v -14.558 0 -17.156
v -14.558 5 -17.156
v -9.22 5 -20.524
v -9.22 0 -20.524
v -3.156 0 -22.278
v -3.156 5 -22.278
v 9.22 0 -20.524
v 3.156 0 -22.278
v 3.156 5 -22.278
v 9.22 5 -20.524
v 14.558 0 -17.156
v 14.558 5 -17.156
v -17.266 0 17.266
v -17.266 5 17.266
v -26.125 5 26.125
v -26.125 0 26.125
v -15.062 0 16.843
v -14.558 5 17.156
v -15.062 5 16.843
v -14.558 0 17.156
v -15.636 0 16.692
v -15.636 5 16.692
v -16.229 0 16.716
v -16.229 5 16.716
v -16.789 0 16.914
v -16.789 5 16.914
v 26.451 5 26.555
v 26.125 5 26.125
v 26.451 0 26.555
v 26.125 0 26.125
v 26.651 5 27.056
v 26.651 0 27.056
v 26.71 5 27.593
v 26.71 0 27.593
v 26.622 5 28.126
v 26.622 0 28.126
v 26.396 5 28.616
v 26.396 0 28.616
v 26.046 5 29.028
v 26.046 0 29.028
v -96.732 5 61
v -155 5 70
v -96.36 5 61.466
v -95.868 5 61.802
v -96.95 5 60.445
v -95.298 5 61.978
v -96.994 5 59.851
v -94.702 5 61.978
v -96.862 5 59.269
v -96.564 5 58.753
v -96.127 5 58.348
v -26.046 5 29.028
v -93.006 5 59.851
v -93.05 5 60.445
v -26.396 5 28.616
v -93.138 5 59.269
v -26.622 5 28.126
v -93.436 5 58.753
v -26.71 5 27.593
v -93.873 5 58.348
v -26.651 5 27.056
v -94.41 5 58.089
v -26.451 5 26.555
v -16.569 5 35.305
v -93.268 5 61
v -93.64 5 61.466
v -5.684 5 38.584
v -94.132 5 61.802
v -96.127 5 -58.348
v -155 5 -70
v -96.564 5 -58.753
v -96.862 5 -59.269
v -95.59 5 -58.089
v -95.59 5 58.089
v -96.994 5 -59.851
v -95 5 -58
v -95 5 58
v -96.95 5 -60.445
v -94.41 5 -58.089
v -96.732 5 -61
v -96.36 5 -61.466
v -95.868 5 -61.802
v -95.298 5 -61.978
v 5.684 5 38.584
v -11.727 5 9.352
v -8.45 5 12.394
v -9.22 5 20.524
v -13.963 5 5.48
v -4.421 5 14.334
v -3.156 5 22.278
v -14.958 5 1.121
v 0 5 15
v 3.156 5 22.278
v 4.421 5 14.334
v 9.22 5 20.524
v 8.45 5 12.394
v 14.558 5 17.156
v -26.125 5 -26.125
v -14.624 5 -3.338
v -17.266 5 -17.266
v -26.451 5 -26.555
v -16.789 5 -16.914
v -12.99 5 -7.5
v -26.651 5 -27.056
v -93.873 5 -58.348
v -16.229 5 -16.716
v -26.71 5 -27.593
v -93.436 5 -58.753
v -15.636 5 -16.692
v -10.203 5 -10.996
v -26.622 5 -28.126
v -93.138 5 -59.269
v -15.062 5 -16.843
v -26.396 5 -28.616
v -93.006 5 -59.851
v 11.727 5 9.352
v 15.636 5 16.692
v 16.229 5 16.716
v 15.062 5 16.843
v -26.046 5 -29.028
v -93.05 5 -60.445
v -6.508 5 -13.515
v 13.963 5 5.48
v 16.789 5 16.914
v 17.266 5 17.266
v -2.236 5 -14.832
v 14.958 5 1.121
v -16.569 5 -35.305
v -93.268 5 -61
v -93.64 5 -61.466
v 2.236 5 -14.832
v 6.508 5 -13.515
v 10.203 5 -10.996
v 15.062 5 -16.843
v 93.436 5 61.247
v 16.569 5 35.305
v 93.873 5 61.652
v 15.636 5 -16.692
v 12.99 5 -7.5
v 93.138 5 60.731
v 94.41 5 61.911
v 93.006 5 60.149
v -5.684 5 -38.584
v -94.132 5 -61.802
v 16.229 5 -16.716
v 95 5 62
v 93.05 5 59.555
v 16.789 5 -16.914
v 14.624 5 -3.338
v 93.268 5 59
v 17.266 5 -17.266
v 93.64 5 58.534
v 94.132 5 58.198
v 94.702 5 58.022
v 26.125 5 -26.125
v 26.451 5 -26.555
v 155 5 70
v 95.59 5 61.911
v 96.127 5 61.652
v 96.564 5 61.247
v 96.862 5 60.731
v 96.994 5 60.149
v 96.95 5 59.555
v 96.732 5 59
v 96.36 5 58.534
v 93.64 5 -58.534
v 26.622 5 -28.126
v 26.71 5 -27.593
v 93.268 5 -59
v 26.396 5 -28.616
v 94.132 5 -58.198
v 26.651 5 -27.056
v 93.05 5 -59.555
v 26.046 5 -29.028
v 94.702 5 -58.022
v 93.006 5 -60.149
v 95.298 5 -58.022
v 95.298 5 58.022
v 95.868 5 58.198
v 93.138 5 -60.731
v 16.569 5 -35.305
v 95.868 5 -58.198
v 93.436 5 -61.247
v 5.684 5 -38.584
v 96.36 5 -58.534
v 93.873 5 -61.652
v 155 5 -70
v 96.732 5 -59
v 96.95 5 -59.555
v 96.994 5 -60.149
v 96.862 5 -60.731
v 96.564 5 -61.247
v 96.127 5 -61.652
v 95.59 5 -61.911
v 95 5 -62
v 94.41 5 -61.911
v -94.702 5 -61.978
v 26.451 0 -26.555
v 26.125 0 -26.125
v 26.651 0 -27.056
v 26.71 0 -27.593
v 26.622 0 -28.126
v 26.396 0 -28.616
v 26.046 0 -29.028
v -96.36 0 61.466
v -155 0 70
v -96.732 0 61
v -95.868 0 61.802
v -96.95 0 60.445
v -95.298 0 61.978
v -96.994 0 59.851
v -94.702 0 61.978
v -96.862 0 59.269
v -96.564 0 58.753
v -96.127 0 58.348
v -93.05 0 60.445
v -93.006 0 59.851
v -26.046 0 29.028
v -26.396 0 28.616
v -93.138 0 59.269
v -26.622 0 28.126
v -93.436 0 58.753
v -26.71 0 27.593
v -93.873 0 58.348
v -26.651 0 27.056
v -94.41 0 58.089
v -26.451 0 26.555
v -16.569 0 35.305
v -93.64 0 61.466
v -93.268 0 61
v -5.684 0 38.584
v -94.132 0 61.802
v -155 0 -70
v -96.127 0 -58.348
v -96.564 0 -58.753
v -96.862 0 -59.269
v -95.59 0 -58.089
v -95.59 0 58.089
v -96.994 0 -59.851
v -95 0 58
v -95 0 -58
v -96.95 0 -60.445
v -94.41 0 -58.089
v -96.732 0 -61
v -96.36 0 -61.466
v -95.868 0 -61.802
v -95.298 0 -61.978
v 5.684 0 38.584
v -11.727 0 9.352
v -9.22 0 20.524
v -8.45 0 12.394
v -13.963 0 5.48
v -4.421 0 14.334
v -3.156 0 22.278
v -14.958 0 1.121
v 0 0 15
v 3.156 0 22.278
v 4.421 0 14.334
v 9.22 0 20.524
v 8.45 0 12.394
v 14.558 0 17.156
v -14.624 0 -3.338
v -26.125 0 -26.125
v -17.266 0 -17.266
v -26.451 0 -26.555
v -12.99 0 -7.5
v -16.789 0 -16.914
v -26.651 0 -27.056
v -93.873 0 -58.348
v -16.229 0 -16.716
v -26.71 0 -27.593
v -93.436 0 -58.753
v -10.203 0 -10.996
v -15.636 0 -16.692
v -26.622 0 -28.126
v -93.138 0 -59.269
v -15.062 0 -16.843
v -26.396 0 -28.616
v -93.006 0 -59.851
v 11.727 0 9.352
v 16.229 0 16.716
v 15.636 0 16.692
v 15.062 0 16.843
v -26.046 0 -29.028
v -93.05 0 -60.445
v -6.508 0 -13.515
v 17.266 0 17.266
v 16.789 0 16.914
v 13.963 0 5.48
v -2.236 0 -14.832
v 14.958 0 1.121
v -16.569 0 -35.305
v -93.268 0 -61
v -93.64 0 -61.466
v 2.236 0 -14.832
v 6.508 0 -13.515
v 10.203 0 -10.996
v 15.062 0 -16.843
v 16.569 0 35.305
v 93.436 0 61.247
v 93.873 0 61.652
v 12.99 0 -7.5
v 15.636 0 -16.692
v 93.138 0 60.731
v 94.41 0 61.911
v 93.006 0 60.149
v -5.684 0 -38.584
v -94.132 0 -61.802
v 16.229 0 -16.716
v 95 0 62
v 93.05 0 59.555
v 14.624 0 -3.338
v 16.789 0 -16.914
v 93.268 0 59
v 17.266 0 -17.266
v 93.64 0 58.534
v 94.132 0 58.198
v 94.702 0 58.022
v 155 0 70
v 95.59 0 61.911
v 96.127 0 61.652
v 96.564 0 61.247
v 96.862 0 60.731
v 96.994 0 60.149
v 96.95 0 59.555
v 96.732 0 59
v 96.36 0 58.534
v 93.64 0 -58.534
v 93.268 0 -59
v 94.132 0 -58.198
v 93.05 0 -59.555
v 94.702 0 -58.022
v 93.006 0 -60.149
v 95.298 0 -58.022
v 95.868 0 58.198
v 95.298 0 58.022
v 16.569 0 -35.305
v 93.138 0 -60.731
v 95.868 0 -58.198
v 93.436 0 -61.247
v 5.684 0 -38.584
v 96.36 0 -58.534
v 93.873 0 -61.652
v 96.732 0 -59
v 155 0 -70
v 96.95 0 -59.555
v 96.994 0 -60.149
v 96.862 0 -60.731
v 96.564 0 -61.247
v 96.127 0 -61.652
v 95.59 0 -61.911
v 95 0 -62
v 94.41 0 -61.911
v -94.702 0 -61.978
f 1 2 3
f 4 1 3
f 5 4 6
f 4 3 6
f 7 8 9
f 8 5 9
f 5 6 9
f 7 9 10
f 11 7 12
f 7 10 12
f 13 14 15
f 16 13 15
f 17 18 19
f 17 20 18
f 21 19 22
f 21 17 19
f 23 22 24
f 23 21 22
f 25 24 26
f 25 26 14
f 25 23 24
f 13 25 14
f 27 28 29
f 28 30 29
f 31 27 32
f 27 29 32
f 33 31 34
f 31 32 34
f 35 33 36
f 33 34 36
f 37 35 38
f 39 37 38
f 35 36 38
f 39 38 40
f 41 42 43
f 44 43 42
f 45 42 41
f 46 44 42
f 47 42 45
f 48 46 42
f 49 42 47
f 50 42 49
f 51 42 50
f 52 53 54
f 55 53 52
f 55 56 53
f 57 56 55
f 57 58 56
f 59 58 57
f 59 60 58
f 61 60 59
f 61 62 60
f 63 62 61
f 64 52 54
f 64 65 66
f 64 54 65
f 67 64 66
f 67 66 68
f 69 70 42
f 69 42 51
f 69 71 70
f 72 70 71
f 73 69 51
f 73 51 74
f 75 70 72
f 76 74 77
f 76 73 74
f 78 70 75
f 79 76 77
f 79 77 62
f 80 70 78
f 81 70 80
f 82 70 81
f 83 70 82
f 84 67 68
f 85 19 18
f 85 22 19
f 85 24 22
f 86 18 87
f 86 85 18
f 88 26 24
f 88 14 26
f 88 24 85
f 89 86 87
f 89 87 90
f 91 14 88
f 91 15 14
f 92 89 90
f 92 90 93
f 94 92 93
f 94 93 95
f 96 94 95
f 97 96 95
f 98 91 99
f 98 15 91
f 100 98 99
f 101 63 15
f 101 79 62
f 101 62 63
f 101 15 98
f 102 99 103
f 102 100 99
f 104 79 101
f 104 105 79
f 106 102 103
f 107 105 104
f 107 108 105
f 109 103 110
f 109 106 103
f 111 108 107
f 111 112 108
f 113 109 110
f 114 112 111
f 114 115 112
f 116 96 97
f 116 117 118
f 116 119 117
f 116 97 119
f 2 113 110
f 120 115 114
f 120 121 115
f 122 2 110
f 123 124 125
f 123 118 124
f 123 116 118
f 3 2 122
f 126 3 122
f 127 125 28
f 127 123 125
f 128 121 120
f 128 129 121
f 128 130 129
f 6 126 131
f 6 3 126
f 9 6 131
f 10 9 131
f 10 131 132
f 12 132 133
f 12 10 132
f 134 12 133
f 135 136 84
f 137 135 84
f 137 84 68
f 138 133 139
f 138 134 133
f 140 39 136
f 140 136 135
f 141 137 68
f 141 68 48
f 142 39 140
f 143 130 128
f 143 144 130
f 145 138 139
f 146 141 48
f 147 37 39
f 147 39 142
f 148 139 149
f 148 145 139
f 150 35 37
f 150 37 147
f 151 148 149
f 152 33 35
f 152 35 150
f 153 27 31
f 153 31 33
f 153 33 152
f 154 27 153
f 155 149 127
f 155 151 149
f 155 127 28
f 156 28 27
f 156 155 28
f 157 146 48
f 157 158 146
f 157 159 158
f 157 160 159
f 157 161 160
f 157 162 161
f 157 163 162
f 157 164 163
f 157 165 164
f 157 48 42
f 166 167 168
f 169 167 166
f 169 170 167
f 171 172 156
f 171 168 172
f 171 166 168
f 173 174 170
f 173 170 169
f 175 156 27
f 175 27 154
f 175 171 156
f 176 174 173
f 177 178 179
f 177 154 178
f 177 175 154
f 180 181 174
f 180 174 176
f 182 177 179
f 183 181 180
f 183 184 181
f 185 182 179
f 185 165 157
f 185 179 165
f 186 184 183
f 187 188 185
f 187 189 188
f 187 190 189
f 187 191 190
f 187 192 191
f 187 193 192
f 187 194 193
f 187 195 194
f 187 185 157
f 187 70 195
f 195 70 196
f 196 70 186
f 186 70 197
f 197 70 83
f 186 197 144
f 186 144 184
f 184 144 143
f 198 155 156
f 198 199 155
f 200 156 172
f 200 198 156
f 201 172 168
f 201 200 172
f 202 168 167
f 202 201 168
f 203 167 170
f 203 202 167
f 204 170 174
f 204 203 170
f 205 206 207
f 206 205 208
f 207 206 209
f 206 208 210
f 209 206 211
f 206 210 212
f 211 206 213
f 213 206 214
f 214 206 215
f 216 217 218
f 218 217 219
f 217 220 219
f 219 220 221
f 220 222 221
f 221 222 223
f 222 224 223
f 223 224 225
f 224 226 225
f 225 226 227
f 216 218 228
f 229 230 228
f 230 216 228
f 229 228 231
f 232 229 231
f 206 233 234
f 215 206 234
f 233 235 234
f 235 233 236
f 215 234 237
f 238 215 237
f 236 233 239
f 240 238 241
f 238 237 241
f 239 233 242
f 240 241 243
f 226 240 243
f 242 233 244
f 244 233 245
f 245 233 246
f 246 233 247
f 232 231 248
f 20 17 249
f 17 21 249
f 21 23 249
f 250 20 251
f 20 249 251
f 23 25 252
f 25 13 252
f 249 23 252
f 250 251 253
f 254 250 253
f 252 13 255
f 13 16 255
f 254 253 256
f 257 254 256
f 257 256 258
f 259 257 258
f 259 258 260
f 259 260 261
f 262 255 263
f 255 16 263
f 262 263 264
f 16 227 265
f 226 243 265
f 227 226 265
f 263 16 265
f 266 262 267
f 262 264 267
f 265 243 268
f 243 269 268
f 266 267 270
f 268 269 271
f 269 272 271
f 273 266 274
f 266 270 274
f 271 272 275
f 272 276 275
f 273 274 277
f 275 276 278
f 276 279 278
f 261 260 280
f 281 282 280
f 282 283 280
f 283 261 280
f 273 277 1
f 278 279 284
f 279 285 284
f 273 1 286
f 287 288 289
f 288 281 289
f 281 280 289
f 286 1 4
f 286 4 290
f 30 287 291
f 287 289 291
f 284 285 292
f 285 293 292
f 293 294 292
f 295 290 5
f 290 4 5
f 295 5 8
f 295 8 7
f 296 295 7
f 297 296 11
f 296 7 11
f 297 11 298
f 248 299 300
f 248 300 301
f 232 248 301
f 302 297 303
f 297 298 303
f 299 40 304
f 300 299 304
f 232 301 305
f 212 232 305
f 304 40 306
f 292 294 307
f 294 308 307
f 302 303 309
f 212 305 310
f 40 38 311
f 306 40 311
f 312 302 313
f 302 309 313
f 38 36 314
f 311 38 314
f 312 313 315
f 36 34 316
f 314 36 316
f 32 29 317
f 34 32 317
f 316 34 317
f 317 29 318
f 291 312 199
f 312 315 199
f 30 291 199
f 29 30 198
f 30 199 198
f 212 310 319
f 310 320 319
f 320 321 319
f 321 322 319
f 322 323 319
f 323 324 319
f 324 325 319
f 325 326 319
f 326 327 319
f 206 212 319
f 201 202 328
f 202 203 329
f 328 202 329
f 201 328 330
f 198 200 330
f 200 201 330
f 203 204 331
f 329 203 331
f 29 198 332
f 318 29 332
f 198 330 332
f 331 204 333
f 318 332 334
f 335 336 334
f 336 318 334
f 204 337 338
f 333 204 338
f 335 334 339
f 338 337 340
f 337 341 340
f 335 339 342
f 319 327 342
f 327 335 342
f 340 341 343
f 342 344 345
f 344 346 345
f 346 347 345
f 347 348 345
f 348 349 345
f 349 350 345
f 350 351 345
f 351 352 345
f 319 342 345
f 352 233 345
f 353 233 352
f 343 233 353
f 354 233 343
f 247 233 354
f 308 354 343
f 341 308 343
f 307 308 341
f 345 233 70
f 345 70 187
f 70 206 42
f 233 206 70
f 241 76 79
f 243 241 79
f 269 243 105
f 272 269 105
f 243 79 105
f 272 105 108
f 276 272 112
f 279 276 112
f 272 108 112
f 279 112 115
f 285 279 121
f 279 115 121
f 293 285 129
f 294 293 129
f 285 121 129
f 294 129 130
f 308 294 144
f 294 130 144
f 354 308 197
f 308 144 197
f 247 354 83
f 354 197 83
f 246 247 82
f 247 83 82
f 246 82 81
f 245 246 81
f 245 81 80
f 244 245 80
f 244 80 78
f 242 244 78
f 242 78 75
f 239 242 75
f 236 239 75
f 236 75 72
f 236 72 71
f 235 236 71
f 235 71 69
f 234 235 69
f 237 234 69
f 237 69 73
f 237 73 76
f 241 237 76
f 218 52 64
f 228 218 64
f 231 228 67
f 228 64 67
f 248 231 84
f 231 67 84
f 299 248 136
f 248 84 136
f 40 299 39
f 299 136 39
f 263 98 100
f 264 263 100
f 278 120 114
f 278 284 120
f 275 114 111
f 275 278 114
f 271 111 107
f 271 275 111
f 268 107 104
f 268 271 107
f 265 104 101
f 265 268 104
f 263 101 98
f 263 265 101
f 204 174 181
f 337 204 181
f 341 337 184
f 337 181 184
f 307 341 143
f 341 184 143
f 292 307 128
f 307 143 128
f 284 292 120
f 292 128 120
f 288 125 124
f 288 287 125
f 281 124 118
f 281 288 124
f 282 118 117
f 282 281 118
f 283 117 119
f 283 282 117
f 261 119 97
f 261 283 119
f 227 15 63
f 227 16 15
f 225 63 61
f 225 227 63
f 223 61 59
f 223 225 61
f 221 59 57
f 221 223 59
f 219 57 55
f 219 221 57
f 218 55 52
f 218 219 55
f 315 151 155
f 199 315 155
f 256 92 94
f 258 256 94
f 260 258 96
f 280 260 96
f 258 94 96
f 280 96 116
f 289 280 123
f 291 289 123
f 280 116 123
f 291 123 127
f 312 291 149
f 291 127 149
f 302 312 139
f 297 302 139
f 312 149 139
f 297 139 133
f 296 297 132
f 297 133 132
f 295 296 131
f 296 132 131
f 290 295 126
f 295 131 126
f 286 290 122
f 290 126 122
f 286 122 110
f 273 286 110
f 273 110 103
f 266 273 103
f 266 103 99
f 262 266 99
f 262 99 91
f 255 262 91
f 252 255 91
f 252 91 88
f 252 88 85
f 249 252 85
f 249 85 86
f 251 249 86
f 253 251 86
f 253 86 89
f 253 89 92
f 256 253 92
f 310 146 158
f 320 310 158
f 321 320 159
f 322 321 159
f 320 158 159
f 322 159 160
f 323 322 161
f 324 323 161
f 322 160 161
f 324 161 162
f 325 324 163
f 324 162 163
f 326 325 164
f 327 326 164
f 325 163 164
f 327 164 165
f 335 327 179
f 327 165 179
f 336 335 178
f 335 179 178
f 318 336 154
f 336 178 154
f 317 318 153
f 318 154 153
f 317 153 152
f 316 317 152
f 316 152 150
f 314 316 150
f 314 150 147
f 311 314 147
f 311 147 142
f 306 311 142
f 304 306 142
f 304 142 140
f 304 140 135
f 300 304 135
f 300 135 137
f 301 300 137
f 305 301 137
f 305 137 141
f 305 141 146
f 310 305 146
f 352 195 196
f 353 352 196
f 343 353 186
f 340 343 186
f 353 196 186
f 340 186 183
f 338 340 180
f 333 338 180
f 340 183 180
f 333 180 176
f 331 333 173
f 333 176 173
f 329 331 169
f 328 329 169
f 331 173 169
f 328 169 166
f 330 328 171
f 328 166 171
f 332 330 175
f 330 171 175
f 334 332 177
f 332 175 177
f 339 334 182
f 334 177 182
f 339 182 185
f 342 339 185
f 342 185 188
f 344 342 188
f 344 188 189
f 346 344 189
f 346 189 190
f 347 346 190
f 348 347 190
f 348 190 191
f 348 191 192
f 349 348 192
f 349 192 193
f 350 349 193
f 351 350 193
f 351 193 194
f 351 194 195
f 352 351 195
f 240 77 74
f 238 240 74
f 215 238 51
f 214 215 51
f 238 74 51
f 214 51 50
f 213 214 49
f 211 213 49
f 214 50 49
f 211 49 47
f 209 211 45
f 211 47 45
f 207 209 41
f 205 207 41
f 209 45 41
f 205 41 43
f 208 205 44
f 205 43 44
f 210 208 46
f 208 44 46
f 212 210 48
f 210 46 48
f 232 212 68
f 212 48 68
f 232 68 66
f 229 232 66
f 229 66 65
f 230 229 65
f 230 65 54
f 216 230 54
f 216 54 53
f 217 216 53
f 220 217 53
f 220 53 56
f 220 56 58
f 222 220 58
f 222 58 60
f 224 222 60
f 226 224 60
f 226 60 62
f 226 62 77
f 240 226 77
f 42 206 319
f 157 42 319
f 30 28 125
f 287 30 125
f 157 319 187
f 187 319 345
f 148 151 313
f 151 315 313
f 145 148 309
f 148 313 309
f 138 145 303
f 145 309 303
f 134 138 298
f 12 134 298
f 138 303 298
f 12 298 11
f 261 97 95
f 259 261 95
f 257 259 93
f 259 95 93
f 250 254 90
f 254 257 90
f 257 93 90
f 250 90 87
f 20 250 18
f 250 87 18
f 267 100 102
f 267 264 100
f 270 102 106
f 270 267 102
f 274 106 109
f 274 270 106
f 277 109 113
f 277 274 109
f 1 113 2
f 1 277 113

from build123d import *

# Parameters (mm, degrees)
SKETCH2_W           = 310
SKETCH2_H           = 140
BOSS_EXTRUDE1_DEPTH = 5
SKETCH3_R           = 15
CUT_EXTRUDE1_DEPTH  = 171.146995272
SKETCH5_R           = 2
CUT_EXTRUDE2_DEPTH  = 171.146995272
CUT_EXTRUDE3_DEPTH  = 10
FILLET1_R           = 2


with BuildPart() as part:
    # Sketch2 → Boss-Extrude1 (new body)
    with BuildSketch(Plane(origin=(0, 0, 0), x_dir=(1, 0, 0), z_dir=(0, 1, 0))):
        Rectangle(SKETCH2_W, SKETCH2_H)
    extrude(amount=BOSS_EXTRUDE1_DEPTH)

    # Sketch3 → Cut-Extrude1 (cut, through all)
    with BuildSketch(Plane(origin=(0, 5, 0), x_dir=(1, 0, 0), z_dir=(0, 1, 0))):
        with Locations(Location((0, 0, 0), (0, 0, 270))):
            Circle(SKETCH3_R)
    extrude(amount=-CUT_EXTRUDE1_DEPTH, mode=Mode.SUBTRACT)

    # Sketch5 → Cut-Extrude2 (cut, through all)
    with BuildSketch(Plane(origin=(0, 5, 0), x_dir=(1, 0, 0), z_dir=(0, 1, 0))):
        with Locations(Location((-95, 60, 0), (0, 0, 270))):
            Circle(SKETCH5_R)
        with Locations(Location((95, 60, 0), (0, 0, 90))):
            Circle(SKETCH5_R)
        with Locations(Location((95, -60, 0), (0, 0, 270))):
            Circle(SKETCH5_R)
        with Locations(Location((-95, -60, 0), (0, 0, 90))):
            Circle(SKETCH5_R)
    extrude(amount=-CUT_EXTRUDE2_DEPTH, mode=Mode.SUBTRACT)

    # Sketch6 → Cut-Extrude3 (cut)
    with BuildSketch(Plane(origin=(0, 5, 0), x_dir=(1, 0, 0), z_dir=(0, 1, 0))):
        with BuildLine():
            Line((27.577164466, -27.577164466), (15.909902577, -15.909902577))
            ThreePointArc((15.909902577, -15.909902577), (0, -22.5), (-15.909902577, -15.909902577))
            Line((-15.909902577, -15.909902577), (-27.577164466, -27.577164466))
            ThreePointArc((-27.577164466, -27.577164466), (0, -39), (27.577164466, -27.577164466))
        make_face()
        with BuildLine():
            ThreePointArc((-15.909902577, 15.909902577), (0, 22.5), (15.909902577, 15.909902577))
            Line((15.909902577, 15.909902577), (27.577164466, 27.577164466))
            ThreePointArc((27.577164466, 27.577164466), (0, 39), (-27.577164466, 27.577164466))
            Line((-27.577164466, 27.577164466), (-15.909902577, 15.909902577))
        make_face()
    extrude(amount=-CUT_EXTRUDE3_DEPTH, mode=Mode.SUBTRACT)

    # Fillet1
    fillet1_edges = [part.edges().sort_by_distance(p)[0] for p in [
        (-15.909902577, 2.5, 15.909902577),
        (15.909902577, 2.5, 15.909902577),
        (27.577164466, 2.5, 27.577164466),
        (-27.577164466, 2.5, 27.577164466),
        (15.909902577, 2.5, -15.909902577),
        (-15.909902577, 2.5, -15.909902577),
        (-27.577164466, 2.5, -27.577164466),
        (27.577164466, 2.5, -27.577164466),
    ]]
    fillet(fillet1_edges, radius=FILLET1_R)


solid = part.part
